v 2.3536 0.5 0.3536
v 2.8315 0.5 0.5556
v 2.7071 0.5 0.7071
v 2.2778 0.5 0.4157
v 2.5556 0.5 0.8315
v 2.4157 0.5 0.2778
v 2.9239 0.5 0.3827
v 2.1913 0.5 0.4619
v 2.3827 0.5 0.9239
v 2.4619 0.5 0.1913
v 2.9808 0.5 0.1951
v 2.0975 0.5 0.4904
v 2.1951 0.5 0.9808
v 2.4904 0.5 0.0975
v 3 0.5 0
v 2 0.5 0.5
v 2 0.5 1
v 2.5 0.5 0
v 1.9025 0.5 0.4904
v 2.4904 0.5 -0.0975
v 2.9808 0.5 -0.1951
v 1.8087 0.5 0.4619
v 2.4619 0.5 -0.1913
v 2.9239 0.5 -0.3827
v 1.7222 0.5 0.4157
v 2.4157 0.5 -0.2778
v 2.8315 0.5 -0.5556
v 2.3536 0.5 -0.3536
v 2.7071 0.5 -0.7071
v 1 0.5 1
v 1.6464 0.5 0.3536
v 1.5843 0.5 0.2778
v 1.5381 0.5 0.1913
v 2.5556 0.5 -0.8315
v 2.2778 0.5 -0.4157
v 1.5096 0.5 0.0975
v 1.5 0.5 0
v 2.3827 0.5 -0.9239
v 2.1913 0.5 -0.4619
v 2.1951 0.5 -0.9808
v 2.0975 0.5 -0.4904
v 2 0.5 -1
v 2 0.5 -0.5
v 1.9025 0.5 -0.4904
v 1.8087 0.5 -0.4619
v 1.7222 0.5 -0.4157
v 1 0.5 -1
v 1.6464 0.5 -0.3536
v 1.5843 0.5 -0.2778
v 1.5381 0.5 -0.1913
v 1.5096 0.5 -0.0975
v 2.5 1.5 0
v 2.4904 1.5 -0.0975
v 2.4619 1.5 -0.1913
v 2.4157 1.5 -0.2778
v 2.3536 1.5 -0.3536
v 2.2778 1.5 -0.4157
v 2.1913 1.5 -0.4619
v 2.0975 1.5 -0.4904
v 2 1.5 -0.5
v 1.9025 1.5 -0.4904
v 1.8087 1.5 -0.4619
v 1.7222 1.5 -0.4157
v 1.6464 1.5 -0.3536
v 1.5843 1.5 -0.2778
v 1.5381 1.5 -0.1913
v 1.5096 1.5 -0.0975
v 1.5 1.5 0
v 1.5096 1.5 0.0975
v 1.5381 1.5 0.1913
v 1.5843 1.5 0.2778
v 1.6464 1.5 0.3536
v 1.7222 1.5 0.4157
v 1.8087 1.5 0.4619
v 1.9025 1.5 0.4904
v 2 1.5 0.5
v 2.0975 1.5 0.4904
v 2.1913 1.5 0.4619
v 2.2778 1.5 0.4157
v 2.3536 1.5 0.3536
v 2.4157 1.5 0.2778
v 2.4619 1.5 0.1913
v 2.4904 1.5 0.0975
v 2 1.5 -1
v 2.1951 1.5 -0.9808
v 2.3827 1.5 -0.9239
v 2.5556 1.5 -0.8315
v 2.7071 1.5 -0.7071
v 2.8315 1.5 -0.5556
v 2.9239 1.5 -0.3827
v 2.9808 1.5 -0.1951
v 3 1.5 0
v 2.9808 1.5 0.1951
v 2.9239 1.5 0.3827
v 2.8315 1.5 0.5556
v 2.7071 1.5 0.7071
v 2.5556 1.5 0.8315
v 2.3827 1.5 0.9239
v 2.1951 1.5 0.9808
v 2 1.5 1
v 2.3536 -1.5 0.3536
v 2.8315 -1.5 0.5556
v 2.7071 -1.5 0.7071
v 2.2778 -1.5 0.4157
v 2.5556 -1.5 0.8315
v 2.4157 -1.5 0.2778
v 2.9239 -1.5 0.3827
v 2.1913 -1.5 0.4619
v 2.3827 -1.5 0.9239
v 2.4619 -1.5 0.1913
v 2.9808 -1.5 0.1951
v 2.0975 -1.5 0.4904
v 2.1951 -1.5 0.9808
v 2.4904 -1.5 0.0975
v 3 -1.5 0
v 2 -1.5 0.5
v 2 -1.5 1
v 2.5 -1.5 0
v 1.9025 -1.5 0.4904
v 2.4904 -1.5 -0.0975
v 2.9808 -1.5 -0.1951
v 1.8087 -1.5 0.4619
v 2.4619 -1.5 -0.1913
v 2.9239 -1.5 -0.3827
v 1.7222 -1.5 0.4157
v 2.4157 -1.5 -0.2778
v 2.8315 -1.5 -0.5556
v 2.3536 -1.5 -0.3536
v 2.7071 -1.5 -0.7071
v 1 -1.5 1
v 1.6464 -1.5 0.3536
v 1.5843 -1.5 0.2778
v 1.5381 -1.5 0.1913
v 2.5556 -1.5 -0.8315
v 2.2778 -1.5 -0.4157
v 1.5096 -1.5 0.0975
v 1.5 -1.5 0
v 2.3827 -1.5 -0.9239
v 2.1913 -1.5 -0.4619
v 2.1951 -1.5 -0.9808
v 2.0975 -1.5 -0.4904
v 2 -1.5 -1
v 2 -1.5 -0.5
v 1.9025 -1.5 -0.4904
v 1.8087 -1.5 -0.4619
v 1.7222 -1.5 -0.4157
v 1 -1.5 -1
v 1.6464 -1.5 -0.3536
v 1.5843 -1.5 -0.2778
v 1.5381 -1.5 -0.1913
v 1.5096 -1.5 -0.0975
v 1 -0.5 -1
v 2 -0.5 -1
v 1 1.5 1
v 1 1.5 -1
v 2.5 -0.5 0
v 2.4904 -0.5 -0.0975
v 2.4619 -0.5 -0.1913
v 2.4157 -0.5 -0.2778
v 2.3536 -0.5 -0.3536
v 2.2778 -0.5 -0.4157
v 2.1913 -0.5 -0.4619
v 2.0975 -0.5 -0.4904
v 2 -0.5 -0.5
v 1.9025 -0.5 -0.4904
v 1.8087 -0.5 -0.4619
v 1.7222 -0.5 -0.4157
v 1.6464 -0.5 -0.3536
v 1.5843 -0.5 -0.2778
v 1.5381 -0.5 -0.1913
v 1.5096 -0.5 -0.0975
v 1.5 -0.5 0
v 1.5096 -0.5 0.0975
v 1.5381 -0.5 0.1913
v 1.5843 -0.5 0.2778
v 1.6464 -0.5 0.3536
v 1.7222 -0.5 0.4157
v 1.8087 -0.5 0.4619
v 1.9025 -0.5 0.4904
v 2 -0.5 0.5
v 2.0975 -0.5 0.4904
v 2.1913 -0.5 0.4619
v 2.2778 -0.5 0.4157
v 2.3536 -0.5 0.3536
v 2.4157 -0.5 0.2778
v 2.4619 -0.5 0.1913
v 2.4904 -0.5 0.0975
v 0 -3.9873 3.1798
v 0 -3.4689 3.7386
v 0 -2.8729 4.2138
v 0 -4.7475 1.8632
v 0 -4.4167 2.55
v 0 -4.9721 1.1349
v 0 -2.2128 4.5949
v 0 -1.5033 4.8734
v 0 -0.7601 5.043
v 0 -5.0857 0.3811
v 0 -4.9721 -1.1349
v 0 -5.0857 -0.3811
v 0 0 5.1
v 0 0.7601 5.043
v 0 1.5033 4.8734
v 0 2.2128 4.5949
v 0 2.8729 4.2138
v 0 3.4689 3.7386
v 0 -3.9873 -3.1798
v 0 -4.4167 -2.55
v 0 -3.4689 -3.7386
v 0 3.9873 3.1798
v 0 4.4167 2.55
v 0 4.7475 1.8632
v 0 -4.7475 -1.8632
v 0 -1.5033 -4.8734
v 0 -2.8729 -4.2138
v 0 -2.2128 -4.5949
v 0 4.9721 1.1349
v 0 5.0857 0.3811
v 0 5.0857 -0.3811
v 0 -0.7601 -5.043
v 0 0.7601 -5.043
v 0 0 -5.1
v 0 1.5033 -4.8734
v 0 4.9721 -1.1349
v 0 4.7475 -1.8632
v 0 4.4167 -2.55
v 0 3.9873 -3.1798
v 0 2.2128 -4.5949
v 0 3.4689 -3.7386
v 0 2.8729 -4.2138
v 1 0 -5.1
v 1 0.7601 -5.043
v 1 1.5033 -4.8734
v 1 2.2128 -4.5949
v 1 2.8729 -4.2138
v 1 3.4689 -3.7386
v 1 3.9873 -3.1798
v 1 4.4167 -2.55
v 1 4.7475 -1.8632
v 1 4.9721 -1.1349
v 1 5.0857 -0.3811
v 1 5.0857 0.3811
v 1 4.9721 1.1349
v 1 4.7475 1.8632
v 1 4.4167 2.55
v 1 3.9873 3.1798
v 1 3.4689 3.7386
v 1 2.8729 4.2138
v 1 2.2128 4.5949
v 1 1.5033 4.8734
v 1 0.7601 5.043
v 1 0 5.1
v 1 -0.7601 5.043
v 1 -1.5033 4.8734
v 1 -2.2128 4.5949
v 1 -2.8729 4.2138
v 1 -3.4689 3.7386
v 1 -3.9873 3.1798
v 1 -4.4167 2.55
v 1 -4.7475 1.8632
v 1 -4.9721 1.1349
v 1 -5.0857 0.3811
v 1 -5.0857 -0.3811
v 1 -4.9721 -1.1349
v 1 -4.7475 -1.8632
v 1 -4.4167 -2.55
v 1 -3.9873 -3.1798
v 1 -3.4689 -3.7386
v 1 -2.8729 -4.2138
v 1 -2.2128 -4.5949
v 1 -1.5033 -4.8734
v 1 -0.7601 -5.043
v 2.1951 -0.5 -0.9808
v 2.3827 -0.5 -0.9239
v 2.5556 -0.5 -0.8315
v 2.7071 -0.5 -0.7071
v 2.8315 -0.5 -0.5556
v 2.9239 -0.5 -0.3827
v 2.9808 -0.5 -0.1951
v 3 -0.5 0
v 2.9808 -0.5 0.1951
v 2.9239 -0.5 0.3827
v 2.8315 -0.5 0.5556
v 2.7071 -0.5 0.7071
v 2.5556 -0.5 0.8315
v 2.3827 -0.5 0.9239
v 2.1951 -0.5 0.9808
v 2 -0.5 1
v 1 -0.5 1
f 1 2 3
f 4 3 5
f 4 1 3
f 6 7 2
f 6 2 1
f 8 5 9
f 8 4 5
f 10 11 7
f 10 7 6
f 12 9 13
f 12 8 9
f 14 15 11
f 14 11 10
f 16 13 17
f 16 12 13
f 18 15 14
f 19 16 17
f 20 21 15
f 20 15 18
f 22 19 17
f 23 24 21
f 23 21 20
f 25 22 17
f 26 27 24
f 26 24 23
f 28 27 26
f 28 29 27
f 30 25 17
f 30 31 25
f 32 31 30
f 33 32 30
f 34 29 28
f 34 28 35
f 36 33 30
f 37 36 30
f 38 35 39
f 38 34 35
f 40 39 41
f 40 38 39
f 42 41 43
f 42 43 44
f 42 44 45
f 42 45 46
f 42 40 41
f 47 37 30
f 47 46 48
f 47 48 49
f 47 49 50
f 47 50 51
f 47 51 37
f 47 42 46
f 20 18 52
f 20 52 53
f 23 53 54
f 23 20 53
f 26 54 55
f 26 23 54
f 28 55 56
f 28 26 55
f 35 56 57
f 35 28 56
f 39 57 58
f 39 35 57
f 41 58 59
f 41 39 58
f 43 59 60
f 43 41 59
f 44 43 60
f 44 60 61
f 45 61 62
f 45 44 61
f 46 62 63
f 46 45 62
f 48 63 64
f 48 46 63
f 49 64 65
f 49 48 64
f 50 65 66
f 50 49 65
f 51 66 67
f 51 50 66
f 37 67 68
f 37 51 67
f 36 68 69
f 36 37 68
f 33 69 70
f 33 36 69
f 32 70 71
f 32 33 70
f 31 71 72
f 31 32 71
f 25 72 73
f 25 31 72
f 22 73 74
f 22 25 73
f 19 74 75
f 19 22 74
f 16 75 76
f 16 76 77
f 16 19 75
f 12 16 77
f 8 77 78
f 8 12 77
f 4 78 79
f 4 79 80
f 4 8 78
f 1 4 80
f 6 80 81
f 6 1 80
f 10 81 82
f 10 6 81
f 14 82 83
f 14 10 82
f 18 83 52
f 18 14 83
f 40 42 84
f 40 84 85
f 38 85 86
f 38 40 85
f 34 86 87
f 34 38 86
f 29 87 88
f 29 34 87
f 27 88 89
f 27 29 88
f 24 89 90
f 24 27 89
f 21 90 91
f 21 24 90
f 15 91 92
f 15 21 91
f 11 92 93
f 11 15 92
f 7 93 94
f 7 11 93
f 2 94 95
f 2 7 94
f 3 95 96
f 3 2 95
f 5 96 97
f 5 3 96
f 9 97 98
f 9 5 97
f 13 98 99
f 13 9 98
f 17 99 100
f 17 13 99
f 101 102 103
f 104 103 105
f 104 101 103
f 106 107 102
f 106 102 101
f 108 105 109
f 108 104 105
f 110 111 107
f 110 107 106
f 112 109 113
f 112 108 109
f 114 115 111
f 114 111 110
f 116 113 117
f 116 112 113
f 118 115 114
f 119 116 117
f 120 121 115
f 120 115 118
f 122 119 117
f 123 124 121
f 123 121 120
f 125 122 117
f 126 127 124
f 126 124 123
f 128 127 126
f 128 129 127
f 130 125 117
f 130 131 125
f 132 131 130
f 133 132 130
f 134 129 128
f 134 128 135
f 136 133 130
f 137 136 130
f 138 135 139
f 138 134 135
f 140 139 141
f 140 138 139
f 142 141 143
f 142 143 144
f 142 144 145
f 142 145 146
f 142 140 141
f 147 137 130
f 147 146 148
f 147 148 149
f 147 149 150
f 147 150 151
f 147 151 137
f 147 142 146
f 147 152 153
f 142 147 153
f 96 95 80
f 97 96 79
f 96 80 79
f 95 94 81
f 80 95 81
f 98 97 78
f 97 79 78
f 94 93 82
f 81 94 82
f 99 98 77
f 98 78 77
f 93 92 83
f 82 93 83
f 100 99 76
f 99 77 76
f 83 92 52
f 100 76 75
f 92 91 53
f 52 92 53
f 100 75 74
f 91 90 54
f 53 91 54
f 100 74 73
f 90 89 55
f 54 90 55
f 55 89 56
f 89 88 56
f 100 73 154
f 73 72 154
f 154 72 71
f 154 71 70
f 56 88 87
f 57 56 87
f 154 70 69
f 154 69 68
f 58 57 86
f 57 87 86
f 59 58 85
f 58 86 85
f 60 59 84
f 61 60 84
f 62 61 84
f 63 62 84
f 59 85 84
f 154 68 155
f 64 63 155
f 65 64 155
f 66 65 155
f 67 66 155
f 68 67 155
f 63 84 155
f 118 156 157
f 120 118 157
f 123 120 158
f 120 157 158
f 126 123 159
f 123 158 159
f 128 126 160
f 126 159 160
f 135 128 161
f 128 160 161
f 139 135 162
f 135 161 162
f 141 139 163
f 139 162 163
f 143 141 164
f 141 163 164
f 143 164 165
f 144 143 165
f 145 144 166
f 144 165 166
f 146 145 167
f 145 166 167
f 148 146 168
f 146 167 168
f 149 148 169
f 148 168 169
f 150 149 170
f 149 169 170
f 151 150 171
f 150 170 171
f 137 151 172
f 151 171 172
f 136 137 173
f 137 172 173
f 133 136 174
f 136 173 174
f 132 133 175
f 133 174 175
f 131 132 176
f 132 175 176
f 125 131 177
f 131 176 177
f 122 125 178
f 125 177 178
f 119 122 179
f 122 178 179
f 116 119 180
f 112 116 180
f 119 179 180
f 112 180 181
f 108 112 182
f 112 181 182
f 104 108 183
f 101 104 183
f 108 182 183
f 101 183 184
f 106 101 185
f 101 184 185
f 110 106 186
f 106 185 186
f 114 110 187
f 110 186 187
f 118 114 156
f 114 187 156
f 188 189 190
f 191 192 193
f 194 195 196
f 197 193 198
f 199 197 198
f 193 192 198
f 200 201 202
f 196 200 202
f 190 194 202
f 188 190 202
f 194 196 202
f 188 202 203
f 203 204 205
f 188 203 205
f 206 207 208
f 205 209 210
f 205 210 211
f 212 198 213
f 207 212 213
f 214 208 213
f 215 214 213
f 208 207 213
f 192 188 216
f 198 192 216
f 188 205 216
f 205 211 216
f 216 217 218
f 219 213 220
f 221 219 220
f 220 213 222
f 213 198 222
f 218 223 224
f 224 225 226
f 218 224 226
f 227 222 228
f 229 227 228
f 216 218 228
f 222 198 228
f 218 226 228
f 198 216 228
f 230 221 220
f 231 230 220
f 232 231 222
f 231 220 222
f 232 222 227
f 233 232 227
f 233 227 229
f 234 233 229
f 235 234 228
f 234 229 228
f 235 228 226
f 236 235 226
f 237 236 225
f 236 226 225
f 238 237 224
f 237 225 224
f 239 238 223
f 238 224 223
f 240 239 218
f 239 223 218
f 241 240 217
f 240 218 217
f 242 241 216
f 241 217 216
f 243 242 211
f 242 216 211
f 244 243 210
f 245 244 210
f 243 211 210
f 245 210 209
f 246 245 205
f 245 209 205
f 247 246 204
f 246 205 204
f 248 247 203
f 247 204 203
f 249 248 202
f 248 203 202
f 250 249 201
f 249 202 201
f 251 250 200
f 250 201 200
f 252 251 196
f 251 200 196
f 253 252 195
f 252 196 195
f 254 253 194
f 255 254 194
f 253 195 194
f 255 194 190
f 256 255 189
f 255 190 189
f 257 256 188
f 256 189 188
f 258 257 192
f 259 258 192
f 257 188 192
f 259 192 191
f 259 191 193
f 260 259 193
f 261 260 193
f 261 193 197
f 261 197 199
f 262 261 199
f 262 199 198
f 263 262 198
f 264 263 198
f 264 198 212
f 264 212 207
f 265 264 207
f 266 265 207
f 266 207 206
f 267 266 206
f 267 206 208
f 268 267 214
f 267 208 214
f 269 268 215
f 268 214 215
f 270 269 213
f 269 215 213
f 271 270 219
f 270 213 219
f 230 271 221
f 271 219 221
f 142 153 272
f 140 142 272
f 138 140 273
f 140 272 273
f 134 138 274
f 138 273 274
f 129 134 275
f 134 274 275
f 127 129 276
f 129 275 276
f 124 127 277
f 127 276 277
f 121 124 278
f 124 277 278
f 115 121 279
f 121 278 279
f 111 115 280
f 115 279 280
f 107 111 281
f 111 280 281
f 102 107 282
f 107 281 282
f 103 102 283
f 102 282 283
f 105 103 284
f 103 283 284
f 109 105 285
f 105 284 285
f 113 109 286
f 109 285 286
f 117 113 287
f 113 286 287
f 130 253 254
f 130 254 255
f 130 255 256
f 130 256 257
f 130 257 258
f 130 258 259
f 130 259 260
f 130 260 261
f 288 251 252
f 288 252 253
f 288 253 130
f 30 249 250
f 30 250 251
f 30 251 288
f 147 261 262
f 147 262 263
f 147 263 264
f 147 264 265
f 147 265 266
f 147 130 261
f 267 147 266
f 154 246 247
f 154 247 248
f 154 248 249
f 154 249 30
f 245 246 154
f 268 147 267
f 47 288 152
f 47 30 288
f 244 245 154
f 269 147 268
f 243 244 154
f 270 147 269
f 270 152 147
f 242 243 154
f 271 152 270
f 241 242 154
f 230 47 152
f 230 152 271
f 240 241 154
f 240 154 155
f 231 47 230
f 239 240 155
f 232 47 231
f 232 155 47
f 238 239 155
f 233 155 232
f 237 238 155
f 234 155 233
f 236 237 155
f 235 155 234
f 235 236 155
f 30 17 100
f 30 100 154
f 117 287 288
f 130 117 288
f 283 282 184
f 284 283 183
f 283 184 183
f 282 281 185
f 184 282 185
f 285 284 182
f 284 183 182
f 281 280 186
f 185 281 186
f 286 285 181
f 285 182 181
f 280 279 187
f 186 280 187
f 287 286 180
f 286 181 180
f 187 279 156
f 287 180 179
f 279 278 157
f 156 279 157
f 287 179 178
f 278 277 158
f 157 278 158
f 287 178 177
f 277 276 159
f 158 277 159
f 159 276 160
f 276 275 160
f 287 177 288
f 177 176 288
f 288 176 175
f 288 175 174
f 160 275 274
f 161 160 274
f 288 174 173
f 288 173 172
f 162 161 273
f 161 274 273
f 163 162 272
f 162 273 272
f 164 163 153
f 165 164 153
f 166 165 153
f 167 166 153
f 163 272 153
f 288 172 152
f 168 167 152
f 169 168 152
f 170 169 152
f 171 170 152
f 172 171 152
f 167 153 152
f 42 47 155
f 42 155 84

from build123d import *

# Parameters (mm, degrees)
SKETCH1_R           = 5.1
BOSS_EXTRUDE1_DEPTH = 1
BOSS_EXTRUDE2_START = 0.5
SKETCH2_R           = 0.5
BOSS_EXTRUDE2_DEPTH = 1


with BuildPart() as part:
    # Sketch1 → Boss-Extrude1 (new body)
    with BuildSketch(Plane(origin=(0, 0, 0), x_dir=(0, 0, -1), z_dir=(1, 0, 0))):
        Circle(SKETCH1_R)
    extrude(amount=BOSS_EXTRUDE1_DEPTH)

    # Sketch2 → Boss-Extrude2 (add)
    with BuildSketch(Plane(origin=(0, 0, 0), x_dir=(1, 0, 0), z_dir=(0, 1, 0)).offset(BOSS_EXTRUDE2_START)):
        with BuildLine():
            Line((1, 1), (2, 1))
            ThreePointArc((2, 1), (3, 0), (2, -1))
            Line((2, -1), (1, -1))
            Line((1, -1), (1, 1))
        make_face()
        with Locations((2, 0)):
            Circle(SKETCH2_R, mode=Mode.SUBTRACT)
    boss_extrude2 = extrude(amount=BOSS_EXTRUDE2_DEPTH)

    # Mirror1: Boss-Extrude2 across plane
    add(boss_extrude2.mirror(Plane.ZX))


solid = part.part
